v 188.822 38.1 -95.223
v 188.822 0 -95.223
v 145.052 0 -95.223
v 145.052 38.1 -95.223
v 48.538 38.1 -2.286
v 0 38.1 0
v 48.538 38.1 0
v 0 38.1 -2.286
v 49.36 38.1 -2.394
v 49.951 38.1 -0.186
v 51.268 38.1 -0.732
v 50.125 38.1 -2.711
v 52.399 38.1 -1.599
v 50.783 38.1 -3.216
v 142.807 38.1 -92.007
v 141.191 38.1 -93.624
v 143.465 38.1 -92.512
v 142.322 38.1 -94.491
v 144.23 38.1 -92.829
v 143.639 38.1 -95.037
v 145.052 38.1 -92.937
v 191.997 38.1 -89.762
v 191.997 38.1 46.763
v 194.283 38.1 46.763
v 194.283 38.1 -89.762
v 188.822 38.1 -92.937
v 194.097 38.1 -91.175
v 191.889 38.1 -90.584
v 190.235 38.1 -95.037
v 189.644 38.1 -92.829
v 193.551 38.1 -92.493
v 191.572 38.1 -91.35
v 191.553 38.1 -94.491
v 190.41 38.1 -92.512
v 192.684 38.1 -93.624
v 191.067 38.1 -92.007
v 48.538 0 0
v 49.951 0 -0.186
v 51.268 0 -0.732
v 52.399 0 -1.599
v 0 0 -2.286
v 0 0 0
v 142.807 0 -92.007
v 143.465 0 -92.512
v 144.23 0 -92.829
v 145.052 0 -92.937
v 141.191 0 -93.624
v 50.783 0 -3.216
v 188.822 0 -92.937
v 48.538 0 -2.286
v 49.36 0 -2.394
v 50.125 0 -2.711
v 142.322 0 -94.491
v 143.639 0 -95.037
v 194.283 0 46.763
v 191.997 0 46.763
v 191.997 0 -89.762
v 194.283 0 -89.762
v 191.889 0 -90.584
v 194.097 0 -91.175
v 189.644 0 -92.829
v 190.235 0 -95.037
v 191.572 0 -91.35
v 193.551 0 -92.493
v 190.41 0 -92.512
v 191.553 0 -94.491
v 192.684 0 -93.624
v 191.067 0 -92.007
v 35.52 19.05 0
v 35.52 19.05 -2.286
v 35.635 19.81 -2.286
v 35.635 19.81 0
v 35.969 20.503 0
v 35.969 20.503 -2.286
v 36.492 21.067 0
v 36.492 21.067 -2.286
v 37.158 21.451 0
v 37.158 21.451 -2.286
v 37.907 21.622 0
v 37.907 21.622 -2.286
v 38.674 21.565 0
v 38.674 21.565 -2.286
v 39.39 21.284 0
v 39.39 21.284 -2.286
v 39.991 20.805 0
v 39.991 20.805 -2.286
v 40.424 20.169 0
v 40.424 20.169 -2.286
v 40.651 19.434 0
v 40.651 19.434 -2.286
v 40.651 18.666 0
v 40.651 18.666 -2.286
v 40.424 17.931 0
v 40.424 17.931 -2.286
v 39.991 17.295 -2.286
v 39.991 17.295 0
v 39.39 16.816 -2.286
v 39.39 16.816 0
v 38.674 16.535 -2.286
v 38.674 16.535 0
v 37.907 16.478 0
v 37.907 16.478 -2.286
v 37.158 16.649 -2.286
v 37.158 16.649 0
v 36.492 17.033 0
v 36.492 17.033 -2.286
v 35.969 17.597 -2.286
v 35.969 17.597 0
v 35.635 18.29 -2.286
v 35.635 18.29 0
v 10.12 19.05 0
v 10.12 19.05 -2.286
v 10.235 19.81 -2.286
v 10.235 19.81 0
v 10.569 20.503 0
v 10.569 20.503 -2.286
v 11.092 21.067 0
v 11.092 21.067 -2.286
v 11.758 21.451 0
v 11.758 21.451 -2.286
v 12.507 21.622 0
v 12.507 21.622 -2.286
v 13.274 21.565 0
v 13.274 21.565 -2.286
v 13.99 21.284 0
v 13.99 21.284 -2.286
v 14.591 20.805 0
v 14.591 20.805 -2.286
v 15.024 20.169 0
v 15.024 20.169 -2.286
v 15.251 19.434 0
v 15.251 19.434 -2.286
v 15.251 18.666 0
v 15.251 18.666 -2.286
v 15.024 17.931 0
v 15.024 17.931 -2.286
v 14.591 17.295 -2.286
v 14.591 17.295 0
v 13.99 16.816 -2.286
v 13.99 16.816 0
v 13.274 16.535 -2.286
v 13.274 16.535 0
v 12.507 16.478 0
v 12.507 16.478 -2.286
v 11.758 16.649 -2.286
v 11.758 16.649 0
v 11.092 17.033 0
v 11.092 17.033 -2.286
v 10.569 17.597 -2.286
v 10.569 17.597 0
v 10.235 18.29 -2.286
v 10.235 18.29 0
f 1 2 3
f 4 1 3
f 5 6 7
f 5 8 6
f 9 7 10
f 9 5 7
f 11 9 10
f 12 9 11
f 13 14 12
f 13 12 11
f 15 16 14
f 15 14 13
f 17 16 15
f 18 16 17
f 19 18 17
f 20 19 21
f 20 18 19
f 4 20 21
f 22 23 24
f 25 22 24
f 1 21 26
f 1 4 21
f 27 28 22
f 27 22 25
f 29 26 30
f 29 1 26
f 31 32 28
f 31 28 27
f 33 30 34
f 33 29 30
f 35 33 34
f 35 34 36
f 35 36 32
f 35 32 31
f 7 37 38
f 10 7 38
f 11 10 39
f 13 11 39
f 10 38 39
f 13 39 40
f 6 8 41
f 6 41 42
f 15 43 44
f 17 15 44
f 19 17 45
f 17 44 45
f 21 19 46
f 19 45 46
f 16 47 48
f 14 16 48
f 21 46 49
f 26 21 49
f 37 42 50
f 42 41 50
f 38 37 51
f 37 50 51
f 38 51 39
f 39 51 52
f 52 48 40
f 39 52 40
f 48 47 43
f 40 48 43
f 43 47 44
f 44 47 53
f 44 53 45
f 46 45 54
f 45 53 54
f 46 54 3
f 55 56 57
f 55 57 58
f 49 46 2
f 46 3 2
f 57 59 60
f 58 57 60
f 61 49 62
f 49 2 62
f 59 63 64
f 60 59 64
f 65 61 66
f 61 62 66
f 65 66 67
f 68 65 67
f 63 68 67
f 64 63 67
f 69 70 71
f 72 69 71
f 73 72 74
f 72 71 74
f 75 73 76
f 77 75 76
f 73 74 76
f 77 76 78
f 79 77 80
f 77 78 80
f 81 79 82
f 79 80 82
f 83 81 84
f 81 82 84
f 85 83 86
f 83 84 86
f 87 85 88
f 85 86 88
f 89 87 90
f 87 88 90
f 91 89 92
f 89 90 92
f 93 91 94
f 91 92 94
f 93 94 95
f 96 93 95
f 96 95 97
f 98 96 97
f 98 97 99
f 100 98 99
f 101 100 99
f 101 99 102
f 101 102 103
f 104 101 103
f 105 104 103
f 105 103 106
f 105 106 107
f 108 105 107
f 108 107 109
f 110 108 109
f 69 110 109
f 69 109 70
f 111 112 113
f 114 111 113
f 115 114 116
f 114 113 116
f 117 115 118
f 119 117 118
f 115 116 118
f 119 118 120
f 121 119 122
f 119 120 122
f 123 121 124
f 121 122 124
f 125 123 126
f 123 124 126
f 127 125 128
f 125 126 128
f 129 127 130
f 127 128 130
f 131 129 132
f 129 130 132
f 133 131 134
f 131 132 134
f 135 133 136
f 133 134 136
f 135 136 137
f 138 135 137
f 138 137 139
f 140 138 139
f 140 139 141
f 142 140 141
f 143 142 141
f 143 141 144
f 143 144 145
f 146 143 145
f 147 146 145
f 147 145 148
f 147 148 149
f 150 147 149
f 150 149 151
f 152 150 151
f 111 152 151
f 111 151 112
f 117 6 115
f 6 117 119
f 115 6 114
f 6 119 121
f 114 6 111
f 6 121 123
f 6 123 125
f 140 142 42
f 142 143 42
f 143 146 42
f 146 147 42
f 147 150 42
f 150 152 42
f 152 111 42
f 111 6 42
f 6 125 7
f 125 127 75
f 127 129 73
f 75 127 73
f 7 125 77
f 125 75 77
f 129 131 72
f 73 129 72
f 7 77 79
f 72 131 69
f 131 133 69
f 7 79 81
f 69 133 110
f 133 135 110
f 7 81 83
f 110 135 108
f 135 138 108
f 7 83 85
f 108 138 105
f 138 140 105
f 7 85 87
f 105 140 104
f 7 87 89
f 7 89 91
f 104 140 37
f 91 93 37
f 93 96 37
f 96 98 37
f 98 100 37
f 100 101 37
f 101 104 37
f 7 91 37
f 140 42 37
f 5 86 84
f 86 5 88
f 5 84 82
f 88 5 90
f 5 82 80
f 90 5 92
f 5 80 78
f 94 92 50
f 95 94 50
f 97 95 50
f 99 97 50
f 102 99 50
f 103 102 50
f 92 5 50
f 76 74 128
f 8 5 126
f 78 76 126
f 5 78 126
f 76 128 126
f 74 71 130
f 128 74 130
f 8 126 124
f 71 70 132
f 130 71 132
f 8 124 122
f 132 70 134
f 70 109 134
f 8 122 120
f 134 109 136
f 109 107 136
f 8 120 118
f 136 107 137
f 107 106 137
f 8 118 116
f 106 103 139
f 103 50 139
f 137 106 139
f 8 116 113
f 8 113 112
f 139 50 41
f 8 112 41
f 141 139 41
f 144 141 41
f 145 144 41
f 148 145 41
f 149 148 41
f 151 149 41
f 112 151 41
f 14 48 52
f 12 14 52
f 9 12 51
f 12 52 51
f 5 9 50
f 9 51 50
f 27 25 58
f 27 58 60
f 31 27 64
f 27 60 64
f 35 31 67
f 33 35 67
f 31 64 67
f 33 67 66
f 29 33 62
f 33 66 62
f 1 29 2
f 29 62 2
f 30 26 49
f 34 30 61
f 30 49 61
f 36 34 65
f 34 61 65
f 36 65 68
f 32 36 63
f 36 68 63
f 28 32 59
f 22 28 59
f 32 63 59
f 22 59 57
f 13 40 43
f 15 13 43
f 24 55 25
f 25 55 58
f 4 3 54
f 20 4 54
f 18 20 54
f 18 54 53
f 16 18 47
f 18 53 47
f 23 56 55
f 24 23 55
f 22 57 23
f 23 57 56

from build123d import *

# Parameters (mm, degrees)
BASE_FLANGE1_DEPTH = 38.1
SKETCH2_R          = 2.5796875
CUT_EXTRUDE1_DEPTH = 219.711637617


# Sheet-metal steps are written as plain solids
with BuildPart() as part:
    # Sketch1 → Base-Flange1 (new body)
    with BuildSketch(Plane(origin=(0, 0, 0), x_dir=(1, 0, 0), z_dir=(0, 1, 0))):
        with BuildLine():
            Line((0, 0), (48.537979736, 0))
            ThreePointArc((48.537979736, 0), (50.62781396, 0.415693873), (52.399489868, 1.599489868))
            Line((52.399489868, 1.599489868), (142.807064676, 92.007064676))
            ThreePointArc((142.807064676, 92.007064676), (143.837108809, 92.695318162), (145.052128706, 92.937000646))
            Line((145.052128706, 92.937000646), (188.822000646, 92.937000646))
            ThreePointArc((188.822000646, 92.937000646), (191.067064676, 92.007064676), (191.997000646, 89.762000646))
            Line((191.997000646, 89.762000646), (191.997000646, -46.762999354))
            Line((191.997000646, -46.762999354), (194.283000646, -46.762999354))
            Line((194.283000646, -46.762999354), (194.283000646, 89.762000646))
            ThreePointArc((194.283000646, 89.762000646), (192.683510778, 93.623510778), (188.822000646, 95.223000646))
            Line((188.822000646, 95.223000646), (145.052128706, 95.223000646))
            ThreePointArc((145.052128706, 95.223000646), (142.962294482, 94.807306773), (141.190618574, 93.623510778))
            Line((141.190618574, 93.623510778), (50.783043766, 3.21593597))
            ThreePointArc((50.783043766, 3.21593597), (49.752999634, 2.527682484), (48.537979736, 2.286))
            Line((48.537979736, 2.286), (0, 2.286))
            Line((0, 2.286), (0, 0))
        make_face()
    extrude(amount=BASE_FLANGE1_DEPTH)

    # Sketch2 → Cut-Extrude1 (cut, through all)
    with BuildSketch(Plane(origin=(0, 0, -2.286), x_dir=(-1, 0, 0), z_dir=(0, 0, -1))):
        with Locations((-12.7, 19.05)):
            Circle(SKETCH2_R)
        with Locations((-38.1, 19.05)):
            Circle(SKETCH2_R)
    extrude(amount=-CUT_EXTRUDE1_DEPTH, mode=Mode.SUBTRACT)


solid = part.part
